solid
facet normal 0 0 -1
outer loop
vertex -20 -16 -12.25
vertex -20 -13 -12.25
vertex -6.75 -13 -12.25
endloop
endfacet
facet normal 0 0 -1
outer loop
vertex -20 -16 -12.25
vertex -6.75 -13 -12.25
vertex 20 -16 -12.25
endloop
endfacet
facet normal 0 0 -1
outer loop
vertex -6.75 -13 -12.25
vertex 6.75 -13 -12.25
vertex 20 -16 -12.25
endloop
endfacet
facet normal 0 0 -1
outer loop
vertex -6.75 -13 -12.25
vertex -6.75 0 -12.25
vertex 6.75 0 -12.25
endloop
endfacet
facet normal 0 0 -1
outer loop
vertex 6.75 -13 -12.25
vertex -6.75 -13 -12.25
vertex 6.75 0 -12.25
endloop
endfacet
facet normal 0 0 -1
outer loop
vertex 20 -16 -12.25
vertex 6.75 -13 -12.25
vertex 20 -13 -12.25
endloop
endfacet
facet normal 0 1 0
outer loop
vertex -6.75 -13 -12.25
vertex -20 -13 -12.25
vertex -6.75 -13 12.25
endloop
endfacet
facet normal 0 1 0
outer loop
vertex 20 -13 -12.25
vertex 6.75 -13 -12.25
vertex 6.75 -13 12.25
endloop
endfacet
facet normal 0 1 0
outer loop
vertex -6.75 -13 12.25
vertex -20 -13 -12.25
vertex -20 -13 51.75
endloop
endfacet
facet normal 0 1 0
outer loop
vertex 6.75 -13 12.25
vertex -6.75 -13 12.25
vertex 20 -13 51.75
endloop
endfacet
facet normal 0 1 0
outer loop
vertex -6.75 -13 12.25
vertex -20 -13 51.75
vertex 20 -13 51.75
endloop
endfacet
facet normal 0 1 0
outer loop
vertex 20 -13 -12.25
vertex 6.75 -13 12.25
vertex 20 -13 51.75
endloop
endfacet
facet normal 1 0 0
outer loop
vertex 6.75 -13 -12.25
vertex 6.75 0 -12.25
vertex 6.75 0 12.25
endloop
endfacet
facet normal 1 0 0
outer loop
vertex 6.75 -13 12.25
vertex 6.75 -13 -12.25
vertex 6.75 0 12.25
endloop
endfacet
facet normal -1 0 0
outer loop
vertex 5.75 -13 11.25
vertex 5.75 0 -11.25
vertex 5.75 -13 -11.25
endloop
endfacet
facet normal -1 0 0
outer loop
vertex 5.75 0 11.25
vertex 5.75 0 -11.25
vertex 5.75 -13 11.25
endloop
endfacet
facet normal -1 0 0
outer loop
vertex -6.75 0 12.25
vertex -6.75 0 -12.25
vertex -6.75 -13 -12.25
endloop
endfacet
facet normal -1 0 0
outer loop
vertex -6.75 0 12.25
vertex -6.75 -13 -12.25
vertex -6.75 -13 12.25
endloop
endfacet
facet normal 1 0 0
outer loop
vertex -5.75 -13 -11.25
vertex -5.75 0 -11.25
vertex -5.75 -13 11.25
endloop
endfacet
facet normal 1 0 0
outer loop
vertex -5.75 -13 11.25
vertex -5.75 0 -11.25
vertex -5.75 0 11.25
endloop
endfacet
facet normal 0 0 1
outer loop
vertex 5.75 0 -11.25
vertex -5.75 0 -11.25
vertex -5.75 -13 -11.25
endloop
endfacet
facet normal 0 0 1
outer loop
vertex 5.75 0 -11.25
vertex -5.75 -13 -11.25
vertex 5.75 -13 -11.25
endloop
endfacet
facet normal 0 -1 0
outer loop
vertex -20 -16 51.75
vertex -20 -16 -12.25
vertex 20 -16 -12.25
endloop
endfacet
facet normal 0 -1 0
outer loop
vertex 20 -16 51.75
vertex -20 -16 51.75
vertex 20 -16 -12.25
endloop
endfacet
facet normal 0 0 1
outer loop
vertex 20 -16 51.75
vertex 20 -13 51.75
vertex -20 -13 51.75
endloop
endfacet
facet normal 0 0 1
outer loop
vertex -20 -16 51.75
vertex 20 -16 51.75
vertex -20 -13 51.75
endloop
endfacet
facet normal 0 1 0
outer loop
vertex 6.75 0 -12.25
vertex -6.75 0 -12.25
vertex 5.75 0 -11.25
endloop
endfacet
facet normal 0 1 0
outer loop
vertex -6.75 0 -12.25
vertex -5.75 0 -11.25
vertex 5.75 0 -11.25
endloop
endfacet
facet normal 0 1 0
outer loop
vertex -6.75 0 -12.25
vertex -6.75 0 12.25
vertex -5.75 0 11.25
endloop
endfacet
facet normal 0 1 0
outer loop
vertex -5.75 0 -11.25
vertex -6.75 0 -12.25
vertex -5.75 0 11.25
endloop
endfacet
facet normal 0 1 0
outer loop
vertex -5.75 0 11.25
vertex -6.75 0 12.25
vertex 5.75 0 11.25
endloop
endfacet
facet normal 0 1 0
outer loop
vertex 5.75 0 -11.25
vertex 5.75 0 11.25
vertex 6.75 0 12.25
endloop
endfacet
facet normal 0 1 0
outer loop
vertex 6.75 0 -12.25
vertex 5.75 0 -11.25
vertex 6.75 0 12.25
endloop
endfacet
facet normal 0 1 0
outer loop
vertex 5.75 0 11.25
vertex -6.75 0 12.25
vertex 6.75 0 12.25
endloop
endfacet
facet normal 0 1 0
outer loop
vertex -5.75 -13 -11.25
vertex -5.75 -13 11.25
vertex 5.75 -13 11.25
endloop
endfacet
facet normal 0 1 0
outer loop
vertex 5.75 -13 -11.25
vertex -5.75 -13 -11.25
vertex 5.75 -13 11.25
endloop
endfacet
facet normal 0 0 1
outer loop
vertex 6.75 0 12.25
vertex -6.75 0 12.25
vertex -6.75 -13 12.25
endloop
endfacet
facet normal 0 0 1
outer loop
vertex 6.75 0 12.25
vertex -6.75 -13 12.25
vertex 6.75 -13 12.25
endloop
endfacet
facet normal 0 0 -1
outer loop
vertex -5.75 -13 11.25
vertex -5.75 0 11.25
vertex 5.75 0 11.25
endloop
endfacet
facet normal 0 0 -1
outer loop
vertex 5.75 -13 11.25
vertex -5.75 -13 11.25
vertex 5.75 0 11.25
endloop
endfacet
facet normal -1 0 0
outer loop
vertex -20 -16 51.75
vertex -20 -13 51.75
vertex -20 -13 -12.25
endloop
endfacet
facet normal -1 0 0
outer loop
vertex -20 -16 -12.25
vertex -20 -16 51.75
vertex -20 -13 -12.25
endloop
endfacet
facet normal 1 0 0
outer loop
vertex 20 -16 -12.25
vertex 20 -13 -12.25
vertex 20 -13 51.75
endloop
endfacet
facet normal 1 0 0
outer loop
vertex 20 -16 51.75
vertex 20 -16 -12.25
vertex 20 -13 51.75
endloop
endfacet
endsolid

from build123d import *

# Parameters (mm, degrees)
F0_W     = 13.5
F0_H     = 24.5
F0_W_2   = 11.5
F0_H_2   = 22.5
F1_DEPTH = 13
F2_W     = 13.5
F2_H     = 24.5
F2_W_2   = 11.5
F2_H_2   = 22.5
F3_DEPTH = 3


with BuildPart() as f1:
    # F0 (on Front) → F1 (new body)
    with BuildSketch(Plane.XZ):
        Rectangle(F0_W, F0_H)
        Rectangle(F0_W_2, F0_H_2, mode=Mode.SUBTRACT)
    extrude(amount=F1_DEPTH)

    # F2 (on face) → F3 (join)
    with BuildSketch(Plane.XZ.offset(13)):
        Polygon((-20, 51.75), (-20, -12.25), (-6.75, -12.25), (-6.75, 12.25), (6.75, 12.25), (6.75, -12.25), (20, -12.25), (20, 51.75), align=None)
        Rectangle(F2_W, F2_H)
        Rectangle(F2_W_2, F2_H_2, mode=Mode.SUBTRACT)
        Rectangle(F2_W_2, F2_H_2)
    extrude(amount=F3_DEPTH)


solid = f1.part
